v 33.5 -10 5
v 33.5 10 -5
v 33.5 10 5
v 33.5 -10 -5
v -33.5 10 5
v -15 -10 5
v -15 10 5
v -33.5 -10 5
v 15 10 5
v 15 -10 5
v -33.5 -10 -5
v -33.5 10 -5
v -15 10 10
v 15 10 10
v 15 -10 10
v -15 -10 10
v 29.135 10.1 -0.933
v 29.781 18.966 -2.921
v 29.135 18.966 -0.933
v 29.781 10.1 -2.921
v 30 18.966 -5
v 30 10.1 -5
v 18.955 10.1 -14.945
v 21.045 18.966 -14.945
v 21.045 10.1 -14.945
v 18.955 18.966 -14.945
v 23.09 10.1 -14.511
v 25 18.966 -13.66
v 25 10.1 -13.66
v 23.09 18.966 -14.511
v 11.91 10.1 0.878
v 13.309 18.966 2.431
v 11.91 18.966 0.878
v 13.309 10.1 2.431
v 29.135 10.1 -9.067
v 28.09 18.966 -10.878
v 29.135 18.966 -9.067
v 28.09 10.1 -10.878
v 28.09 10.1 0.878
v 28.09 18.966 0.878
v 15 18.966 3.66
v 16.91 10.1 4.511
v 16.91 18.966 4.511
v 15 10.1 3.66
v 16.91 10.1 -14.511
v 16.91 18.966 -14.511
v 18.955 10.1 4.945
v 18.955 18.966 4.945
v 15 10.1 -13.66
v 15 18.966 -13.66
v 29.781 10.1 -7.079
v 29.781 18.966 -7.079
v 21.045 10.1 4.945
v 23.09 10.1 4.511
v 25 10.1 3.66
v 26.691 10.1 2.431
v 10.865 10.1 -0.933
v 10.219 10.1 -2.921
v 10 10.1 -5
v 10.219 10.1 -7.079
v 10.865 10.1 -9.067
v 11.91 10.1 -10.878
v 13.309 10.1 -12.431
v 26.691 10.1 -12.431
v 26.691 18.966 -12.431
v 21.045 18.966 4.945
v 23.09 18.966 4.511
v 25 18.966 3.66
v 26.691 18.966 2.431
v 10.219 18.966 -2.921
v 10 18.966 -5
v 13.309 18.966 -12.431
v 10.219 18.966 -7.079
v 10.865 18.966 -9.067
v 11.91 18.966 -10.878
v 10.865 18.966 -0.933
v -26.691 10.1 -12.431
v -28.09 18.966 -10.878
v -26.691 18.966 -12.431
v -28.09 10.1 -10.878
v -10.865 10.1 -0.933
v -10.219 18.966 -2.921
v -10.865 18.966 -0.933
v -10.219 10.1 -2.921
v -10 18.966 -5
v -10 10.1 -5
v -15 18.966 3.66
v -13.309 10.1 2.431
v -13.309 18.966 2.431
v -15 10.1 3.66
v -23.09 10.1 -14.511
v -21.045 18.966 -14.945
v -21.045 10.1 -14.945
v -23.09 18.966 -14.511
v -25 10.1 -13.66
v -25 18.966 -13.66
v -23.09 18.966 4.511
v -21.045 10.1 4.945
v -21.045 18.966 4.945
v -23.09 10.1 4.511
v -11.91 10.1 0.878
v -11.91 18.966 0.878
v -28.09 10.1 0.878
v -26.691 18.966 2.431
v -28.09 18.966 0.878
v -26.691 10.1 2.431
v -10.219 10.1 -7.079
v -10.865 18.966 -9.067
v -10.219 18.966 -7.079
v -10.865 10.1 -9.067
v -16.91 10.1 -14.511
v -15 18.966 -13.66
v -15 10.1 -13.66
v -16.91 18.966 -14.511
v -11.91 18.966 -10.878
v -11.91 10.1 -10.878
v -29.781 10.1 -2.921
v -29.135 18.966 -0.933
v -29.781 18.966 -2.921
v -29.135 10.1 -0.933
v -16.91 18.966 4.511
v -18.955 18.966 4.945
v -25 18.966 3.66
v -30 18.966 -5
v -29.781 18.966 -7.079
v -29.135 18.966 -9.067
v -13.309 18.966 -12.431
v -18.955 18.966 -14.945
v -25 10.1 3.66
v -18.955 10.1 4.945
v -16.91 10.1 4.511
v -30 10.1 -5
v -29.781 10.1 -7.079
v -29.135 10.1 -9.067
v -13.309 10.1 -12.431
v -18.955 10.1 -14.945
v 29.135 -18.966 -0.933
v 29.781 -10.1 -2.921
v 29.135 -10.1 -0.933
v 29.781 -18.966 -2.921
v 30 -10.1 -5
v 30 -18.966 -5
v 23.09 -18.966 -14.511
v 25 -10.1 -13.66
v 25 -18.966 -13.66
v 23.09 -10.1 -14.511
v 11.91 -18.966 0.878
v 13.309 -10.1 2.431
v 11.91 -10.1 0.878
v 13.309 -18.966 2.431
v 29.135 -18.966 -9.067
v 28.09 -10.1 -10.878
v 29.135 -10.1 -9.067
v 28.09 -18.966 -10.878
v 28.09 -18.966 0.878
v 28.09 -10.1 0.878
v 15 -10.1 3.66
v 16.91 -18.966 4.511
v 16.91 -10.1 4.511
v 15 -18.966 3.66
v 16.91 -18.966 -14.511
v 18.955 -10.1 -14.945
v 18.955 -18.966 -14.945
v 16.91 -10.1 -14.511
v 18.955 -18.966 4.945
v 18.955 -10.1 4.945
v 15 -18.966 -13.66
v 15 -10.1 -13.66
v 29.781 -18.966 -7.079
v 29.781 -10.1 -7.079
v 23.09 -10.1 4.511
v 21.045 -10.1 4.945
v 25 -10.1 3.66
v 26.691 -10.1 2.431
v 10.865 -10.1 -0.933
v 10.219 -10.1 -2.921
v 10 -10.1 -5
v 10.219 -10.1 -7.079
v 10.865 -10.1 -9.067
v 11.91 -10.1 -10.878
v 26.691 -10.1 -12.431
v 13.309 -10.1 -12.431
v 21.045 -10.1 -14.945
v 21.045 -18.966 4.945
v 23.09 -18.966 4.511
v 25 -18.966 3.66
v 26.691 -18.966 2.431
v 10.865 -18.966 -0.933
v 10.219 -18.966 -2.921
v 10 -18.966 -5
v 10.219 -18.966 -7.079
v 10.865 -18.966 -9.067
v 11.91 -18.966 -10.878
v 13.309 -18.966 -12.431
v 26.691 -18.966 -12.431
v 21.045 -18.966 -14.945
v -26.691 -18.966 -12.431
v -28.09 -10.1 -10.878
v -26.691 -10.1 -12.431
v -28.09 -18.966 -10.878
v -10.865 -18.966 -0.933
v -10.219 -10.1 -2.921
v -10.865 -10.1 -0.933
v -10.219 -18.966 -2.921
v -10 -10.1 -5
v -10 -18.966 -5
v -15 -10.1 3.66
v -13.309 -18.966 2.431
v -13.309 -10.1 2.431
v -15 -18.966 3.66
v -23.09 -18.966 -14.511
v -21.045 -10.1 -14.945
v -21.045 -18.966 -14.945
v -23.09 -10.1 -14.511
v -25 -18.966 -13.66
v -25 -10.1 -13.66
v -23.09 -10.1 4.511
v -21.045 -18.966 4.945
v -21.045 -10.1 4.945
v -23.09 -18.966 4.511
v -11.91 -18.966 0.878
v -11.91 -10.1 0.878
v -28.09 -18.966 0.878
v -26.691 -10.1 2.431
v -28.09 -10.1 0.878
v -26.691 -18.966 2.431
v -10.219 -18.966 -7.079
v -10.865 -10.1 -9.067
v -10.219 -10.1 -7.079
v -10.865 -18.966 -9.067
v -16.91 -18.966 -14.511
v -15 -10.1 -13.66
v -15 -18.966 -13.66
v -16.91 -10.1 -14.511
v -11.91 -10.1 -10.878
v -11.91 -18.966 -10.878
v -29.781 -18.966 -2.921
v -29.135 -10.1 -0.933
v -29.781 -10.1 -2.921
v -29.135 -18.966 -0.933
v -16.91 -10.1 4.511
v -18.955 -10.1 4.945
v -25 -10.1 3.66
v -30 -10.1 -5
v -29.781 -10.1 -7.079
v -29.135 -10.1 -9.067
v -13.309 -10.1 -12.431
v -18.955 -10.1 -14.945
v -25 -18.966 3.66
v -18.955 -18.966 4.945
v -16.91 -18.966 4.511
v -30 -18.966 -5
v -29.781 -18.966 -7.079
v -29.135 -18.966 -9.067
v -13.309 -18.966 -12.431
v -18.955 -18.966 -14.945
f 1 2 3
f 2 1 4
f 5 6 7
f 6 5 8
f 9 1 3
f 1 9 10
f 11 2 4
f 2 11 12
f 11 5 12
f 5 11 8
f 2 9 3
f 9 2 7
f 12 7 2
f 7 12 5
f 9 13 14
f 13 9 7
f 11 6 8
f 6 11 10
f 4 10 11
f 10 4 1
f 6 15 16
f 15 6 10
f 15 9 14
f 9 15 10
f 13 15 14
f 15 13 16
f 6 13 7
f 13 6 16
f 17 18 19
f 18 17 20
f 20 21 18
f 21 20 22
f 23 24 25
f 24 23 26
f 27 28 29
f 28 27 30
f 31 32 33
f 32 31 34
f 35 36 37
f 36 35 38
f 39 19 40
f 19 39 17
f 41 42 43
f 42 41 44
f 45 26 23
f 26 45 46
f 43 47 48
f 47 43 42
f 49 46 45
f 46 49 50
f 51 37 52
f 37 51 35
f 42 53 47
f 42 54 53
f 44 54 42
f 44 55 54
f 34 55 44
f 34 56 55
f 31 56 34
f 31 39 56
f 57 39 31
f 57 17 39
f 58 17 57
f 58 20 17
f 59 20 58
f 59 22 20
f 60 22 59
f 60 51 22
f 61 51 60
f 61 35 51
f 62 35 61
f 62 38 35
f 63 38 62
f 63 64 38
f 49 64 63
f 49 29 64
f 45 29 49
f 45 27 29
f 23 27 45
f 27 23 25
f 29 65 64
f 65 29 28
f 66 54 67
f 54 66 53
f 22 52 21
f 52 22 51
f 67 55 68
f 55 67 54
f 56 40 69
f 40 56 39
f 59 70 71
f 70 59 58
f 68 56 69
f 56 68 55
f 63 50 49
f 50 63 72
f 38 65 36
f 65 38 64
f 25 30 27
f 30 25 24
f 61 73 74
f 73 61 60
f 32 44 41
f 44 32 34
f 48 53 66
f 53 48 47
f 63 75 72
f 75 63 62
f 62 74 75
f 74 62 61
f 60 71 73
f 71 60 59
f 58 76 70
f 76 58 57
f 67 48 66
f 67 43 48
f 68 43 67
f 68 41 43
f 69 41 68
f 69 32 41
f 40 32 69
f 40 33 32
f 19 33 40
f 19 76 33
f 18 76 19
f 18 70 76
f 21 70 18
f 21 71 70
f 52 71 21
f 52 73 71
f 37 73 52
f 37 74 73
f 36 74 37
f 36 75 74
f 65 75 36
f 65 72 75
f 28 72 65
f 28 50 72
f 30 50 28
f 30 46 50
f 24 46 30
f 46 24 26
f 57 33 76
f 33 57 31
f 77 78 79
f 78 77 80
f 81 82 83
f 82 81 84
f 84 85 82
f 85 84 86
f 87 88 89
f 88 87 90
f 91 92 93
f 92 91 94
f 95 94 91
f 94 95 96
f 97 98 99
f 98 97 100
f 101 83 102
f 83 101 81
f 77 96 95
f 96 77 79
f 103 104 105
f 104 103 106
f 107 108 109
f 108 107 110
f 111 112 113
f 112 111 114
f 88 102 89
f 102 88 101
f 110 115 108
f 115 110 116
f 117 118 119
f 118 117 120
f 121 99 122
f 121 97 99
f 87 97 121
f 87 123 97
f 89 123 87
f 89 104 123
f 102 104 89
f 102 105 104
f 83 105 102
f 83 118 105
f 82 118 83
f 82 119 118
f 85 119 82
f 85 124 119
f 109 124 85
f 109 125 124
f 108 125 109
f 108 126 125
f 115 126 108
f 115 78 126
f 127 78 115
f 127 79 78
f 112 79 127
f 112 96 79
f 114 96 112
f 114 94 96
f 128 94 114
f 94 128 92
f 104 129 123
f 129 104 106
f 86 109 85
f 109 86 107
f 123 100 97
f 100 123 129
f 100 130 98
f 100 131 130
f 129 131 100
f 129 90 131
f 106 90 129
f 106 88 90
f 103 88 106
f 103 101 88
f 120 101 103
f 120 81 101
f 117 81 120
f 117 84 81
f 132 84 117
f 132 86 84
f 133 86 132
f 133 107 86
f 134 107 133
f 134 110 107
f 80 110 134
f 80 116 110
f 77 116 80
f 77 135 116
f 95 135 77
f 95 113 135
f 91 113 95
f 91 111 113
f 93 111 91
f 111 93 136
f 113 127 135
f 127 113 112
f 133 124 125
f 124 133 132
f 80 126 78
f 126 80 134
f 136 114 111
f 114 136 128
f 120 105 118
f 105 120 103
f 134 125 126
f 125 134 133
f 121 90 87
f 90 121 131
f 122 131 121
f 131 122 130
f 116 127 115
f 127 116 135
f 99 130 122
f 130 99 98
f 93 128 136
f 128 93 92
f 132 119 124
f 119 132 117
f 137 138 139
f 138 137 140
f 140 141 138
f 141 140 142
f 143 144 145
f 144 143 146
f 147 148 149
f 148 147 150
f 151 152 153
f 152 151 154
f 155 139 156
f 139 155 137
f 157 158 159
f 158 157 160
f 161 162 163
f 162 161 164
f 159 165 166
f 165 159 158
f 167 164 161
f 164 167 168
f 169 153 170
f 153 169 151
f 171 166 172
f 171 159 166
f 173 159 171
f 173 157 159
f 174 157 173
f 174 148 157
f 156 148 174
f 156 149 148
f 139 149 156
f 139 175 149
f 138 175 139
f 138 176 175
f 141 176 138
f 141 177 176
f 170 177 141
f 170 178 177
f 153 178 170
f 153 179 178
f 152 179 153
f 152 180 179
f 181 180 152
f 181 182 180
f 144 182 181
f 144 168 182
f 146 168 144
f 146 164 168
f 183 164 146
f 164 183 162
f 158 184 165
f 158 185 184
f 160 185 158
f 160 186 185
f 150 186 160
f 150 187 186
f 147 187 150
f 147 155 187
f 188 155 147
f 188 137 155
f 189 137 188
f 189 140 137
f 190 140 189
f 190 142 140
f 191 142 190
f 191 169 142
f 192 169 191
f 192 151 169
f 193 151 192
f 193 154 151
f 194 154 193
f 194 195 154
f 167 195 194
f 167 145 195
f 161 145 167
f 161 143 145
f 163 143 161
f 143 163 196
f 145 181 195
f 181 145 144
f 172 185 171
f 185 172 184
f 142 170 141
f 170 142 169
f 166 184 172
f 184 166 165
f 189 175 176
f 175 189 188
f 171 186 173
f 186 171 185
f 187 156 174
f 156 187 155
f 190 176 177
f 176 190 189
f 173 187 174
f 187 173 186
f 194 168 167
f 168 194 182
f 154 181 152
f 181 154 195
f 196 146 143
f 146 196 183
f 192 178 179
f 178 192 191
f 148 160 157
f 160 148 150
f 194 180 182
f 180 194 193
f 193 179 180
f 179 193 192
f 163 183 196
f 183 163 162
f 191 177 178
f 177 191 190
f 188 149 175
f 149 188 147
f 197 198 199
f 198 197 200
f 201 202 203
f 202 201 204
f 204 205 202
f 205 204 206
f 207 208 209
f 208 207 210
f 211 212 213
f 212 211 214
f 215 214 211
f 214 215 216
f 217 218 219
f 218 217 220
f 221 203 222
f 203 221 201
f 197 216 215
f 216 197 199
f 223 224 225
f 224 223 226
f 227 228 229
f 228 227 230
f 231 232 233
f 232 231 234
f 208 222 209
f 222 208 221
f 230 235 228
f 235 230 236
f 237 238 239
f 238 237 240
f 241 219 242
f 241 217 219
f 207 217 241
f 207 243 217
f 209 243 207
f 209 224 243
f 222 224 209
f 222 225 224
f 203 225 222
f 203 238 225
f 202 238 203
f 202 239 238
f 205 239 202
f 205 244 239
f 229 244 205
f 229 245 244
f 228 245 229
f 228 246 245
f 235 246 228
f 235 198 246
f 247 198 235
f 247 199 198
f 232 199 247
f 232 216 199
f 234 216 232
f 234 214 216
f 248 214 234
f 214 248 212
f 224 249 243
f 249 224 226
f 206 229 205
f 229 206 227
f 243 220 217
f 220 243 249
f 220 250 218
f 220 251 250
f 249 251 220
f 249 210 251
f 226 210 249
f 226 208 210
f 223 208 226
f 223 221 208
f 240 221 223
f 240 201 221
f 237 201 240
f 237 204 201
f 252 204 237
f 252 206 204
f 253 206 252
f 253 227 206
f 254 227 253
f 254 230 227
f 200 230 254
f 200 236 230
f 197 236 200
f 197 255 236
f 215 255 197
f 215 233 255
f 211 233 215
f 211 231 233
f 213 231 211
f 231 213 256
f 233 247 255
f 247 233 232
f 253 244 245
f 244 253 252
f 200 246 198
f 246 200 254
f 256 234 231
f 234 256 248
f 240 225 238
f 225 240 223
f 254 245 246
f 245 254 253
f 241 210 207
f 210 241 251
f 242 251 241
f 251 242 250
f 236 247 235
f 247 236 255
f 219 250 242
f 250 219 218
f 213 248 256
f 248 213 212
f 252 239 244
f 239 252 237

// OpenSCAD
w = 20;
wt = 8 + 1*sin(17*$t*360 + 60);
wd = 20 + 10*sin($t*360);
wy=w/2+wt/2+0.1;
 
 color  ("pink")  {
 cube ([67,w,10],center=true);
 translate([0,0,5])
    cube([30,w,10],center=true);
 
translate([20,wy,-5])rotate([90,0,0])
 cylinder(h=wt, d=wd,center=true);
  translate([-20,wy,-5])rotate([90,0,0])
 cylinder(h=wt, d=wd,center=true);
 translate([20,-wy,-5])rotate([90,0,0])
 cylinder(h=wt, d=wd,center=true);
 translate([-20,-wy,-5])rotate([90,0,0])
 cylinder(h=wt, d=wd,center=true);
 }     
